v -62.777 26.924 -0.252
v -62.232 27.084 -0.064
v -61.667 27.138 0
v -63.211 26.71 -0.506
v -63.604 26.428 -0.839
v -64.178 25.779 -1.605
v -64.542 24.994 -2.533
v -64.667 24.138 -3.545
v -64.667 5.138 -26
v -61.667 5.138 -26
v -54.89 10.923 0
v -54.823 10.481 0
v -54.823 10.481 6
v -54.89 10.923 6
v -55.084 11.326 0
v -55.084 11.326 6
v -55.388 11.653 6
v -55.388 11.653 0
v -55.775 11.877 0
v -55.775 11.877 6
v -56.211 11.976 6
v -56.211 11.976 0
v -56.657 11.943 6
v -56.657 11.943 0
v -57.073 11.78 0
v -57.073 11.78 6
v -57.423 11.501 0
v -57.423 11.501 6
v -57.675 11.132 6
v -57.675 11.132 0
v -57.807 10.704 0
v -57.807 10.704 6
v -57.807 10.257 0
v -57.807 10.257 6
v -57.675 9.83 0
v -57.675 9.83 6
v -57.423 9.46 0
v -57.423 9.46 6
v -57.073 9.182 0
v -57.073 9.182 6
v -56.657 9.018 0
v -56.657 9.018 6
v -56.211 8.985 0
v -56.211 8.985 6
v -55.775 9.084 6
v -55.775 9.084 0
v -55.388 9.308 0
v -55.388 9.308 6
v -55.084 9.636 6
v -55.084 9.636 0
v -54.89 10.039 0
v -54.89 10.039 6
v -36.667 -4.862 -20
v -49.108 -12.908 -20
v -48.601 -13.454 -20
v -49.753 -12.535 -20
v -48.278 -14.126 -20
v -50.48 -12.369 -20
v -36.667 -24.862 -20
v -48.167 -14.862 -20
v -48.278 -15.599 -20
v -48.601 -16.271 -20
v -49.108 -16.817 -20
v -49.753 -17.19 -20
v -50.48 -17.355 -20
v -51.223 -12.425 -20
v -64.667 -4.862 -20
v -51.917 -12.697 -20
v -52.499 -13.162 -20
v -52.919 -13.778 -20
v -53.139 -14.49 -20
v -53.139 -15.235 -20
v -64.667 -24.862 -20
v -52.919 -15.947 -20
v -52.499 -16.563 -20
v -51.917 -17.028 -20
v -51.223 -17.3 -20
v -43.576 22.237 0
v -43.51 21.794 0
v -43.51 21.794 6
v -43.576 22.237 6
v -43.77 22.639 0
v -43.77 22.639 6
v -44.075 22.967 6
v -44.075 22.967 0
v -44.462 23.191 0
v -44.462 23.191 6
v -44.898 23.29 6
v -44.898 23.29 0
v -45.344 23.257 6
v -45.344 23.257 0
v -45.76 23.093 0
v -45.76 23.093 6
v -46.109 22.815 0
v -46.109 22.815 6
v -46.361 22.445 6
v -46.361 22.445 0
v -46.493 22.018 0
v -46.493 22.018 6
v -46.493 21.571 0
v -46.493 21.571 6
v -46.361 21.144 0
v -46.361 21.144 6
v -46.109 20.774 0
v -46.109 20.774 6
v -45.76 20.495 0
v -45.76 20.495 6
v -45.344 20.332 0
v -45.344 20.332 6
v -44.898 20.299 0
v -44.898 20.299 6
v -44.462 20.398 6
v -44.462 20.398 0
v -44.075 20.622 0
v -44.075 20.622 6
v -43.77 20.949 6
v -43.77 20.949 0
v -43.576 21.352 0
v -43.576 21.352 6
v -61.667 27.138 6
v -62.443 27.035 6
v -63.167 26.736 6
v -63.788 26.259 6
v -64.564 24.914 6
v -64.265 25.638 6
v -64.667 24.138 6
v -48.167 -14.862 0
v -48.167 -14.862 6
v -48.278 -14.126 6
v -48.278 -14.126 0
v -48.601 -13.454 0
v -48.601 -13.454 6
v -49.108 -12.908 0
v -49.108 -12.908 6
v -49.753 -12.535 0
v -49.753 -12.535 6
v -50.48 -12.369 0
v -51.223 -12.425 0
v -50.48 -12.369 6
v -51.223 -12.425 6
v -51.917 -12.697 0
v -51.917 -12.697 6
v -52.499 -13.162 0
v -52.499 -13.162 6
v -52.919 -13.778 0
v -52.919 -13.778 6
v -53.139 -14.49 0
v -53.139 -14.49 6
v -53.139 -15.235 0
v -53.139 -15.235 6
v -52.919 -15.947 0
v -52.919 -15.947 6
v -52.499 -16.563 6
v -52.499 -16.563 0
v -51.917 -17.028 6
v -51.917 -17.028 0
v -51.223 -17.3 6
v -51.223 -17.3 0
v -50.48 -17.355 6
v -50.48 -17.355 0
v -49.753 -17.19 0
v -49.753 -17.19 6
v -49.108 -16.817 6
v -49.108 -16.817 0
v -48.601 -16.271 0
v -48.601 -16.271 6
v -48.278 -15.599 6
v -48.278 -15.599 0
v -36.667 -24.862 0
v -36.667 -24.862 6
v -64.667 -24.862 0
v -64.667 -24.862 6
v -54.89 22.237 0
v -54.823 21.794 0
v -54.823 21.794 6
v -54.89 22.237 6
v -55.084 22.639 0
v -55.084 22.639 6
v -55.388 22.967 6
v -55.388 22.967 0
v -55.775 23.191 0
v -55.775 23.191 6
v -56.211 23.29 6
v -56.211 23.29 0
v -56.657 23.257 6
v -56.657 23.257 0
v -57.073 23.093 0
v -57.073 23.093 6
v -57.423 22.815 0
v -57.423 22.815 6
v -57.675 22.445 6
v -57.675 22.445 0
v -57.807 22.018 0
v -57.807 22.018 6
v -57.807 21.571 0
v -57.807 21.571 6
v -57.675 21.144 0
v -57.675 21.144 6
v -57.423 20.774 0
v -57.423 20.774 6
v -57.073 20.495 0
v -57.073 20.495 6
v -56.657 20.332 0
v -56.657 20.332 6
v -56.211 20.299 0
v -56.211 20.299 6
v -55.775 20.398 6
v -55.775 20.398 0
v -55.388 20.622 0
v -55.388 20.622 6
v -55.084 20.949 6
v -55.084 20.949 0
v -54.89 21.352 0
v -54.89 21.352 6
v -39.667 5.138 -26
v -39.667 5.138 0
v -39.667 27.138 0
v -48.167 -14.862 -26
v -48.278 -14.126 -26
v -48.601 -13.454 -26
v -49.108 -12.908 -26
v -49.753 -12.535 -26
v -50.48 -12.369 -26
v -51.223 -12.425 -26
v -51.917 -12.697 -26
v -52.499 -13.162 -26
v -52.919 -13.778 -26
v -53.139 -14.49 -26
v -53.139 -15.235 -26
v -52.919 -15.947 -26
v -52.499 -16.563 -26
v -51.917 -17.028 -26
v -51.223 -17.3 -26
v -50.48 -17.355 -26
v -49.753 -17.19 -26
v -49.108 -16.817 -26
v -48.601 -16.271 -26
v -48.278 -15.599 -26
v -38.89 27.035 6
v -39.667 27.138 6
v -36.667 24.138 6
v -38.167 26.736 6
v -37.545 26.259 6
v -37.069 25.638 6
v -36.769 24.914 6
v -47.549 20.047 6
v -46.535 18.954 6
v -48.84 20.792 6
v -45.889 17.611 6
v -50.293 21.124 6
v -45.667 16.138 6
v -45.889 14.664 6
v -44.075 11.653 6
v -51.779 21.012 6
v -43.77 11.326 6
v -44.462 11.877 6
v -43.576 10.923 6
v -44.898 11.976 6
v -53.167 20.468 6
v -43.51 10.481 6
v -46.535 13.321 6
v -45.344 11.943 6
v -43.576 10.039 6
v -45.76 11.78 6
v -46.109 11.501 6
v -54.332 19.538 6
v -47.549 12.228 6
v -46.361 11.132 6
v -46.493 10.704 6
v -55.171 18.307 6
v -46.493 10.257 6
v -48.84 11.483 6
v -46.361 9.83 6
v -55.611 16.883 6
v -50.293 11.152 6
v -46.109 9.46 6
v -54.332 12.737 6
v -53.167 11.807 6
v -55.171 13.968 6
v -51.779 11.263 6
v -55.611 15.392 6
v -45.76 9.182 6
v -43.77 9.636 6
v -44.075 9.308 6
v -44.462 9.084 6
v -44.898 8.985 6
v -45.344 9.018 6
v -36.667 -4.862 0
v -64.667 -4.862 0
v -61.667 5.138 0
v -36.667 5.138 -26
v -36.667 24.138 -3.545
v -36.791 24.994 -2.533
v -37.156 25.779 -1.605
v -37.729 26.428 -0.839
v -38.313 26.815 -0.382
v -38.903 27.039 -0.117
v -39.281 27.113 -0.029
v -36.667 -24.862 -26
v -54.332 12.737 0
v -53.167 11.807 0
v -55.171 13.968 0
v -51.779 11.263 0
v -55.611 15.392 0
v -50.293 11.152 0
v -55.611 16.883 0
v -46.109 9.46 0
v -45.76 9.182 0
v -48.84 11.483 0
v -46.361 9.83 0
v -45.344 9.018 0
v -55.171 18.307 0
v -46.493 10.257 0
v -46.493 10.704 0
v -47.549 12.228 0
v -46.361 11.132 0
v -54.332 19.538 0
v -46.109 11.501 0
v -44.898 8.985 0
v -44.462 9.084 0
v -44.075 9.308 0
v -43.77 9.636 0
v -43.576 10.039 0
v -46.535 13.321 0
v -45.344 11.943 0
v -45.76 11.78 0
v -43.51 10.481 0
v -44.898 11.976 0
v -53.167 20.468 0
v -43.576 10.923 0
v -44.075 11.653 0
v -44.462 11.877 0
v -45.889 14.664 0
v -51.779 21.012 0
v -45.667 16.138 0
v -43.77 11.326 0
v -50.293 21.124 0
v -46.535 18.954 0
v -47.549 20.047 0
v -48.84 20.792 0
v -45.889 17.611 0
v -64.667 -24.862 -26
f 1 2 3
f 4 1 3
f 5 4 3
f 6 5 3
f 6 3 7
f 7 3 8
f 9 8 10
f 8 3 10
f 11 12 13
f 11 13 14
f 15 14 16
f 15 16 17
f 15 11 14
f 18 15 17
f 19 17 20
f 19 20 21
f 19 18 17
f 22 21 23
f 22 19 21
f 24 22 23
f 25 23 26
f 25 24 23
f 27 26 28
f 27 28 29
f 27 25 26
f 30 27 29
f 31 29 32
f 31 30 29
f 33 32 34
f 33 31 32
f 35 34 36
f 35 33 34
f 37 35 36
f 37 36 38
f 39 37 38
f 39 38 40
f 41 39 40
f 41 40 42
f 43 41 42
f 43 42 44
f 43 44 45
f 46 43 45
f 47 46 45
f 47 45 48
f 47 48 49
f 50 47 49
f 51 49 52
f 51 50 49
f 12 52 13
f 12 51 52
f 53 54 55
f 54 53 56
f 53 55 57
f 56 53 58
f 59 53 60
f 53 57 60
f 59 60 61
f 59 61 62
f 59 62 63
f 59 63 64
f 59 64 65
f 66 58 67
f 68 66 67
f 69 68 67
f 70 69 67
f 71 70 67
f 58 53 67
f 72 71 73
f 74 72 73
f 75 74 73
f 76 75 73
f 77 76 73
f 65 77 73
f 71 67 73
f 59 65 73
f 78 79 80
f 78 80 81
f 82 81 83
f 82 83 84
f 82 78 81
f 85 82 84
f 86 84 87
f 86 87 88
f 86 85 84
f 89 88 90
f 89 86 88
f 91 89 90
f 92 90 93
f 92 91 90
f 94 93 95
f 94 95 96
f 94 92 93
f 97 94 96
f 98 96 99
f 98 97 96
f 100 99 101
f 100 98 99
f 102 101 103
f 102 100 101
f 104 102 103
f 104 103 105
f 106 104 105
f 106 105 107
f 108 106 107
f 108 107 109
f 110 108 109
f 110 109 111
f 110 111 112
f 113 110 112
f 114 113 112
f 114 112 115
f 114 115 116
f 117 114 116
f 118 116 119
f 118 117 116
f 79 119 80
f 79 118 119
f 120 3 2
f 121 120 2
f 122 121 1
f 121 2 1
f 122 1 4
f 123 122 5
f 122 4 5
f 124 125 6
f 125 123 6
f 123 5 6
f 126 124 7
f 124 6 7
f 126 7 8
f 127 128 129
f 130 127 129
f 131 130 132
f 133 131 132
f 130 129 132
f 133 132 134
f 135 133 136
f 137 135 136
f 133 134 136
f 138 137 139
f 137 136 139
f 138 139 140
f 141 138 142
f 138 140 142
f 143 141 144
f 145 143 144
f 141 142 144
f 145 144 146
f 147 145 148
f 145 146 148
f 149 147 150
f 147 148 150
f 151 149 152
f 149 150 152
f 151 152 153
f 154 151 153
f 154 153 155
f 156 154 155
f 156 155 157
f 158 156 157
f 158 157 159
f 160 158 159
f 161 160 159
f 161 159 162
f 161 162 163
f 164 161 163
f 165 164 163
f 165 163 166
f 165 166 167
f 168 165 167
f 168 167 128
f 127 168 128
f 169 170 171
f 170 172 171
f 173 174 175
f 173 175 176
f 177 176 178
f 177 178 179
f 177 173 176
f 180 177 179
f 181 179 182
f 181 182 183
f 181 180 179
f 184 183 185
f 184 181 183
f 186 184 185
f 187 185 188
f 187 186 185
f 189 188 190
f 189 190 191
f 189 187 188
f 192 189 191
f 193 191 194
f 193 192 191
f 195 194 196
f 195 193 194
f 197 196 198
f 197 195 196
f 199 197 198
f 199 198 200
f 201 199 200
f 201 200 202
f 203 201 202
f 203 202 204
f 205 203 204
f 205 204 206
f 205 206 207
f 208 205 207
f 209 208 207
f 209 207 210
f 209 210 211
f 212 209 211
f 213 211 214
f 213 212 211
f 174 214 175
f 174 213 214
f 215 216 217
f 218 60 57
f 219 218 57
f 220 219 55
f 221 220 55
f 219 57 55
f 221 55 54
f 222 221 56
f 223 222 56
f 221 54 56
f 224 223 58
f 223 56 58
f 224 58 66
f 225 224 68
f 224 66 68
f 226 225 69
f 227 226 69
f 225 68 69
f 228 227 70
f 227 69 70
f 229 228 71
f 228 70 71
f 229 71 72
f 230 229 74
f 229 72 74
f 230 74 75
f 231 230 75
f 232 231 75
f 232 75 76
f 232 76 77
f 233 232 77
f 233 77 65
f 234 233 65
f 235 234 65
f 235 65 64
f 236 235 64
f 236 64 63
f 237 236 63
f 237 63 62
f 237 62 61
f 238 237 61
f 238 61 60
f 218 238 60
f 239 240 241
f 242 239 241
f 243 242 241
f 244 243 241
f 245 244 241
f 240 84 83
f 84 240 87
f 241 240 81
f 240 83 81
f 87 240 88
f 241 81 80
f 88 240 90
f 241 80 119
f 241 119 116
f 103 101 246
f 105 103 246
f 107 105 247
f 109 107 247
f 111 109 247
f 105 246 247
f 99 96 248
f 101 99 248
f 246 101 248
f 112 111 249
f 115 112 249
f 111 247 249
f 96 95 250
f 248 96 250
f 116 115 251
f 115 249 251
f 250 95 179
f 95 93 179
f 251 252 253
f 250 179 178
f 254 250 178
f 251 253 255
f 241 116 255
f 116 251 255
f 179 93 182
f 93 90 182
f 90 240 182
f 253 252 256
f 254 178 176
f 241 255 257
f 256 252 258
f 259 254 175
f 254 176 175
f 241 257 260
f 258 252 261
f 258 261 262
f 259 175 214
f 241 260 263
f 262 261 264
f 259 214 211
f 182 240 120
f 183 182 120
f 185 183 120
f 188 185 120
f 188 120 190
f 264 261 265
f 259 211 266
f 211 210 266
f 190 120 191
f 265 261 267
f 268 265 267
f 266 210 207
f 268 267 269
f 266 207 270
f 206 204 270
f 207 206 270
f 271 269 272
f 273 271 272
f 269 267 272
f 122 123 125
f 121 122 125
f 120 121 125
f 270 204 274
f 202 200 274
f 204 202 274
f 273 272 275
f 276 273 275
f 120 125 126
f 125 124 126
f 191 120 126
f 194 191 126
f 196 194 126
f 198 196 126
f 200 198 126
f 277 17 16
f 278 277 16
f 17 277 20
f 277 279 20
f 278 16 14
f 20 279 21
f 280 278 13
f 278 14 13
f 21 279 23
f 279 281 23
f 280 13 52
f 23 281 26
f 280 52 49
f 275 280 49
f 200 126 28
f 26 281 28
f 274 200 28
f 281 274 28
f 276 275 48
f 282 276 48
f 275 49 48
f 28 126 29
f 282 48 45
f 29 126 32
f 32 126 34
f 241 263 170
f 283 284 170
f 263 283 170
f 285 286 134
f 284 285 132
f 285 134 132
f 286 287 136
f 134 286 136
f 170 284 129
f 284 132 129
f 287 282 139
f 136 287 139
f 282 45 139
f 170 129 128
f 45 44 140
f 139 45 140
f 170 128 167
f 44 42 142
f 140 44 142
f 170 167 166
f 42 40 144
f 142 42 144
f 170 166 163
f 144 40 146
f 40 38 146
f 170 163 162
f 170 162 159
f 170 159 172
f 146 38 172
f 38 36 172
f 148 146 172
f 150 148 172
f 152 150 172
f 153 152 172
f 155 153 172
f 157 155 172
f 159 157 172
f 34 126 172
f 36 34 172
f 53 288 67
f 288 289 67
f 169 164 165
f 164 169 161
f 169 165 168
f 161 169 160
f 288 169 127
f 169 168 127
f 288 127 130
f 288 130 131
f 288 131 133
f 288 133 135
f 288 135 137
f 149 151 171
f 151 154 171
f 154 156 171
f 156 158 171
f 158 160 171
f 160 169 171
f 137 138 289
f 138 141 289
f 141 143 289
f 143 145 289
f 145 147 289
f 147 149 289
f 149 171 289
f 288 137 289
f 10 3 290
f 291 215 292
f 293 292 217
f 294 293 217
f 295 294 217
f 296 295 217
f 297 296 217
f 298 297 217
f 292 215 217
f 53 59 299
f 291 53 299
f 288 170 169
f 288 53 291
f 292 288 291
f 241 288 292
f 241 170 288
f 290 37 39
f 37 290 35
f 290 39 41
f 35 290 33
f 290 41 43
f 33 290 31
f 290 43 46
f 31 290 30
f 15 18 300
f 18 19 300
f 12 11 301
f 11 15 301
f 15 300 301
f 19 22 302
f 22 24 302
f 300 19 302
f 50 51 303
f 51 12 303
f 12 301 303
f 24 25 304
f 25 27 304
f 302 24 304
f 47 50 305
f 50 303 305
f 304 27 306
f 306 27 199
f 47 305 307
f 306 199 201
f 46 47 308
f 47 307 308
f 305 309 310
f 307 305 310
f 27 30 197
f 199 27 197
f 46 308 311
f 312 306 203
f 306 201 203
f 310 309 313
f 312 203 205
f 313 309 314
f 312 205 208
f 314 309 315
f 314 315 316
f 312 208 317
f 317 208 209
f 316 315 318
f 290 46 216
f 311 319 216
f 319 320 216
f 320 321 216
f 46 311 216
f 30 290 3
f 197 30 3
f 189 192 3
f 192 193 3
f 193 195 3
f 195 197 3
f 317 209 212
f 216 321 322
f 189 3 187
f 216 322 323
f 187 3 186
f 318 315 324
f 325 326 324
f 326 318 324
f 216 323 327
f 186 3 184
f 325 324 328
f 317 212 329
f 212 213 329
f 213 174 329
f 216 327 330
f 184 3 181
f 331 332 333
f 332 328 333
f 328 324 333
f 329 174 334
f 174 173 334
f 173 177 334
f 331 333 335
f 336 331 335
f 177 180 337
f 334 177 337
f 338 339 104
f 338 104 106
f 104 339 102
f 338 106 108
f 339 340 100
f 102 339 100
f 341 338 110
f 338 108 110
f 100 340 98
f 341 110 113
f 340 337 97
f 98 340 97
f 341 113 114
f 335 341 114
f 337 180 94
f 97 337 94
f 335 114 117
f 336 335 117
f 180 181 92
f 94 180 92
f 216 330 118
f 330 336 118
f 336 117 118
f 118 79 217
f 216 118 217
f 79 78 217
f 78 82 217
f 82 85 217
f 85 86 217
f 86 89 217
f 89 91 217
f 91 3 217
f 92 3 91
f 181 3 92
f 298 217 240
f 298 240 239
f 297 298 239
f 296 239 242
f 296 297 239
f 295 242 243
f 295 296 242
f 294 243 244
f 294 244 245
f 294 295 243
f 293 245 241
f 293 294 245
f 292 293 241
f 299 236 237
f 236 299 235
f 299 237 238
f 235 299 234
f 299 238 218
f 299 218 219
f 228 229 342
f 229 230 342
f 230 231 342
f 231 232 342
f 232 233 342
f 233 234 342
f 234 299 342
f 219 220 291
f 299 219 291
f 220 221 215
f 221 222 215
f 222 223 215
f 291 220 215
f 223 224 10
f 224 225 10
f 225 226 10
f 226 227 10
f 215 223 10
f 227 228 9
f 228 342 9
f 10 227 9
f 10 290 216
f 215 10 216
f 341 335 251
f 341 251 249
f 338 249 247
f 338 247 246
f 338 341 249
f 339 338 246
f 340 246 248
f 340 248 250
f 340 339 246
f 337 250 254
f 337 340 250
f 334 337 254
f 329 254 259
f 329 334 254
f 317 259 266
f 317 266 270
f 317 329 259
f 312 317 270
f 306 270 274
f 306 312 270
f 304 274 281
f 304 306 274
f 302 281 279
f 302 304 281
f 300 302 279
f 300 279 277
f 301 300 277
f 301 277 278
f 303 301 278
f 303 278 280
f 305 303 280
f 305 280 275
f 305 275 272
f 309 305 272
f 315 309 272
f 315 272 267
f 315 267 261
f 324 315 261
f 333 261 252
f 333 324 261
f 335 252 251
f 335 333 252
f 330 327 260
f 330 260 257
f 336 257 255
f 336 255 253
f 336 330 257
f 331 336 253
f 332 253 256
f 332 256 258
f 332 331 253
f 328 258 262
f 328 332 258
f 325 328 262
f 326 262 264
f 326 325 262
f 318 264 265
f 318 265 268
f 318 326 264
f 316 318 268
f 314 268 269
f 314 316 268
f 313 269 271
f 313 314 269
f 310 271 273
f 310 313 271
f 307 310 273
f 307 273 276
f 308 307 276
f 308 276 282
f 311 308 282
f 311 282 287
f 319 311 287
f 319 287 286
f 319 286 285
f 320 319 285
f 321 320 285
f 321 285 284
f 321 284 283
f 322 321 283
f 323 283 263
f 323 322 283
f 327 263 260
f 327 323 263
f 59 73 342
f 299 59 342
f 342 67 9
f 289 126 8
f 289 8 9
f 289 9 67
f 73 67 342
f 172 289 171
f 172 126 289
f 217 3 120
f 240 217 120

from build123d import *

# Parameters (mm, degrees)
F0_W          = 22
F0_H          = 22
F0_R          = 1.5
F0_R_2        = 5
F1_DEPTH      = 6
F2_W          = 22
F2_H          = 32
F3_DEPTH      = 10
F4_W          = 22
F4_H          = 6
F5_DEPTH      = 20
F6_R          = 2.5
F7_DEPTH      = 32.001
F9_DEPTH      = 3
F11_DEPTH     = 3
F12_T1_DEPTH  = 21
F12_T6_DEPTH  = 5.7473088859
F12_S7_R      = 3
F12_T8_DEPTH  = 5
F12_T12_DEPTH = 5.7473088859
F12_S13_R     = 3
F12_T14_DEPTH = 5


# Not quite as in the source:
# - a fillet or chamfer that OpenCascade refuses, or shapes differently, is made with other operations: its cross-section is extruded or revolved along the edge and cut away or added
# - a feature of the source that left no trace in its solid (it failed there, or was rolled back) is left out


with BuildPart() as f1:
    # F0 (on Top) → F1 (new body)
    with BuildSketch(Plane.XY):
        with Locations((-50.6666042507, 16.1375404)):
            Rectangle(F0_W, F0_H)
        with Locations((-56.3234585002, 10.4806861505)):
            Circle(F0_R, mode=Mode.SUBTRACT)
        with Locations((-45.0097500012, 10.4806861505)):
            Circle(F0_R, mode=Mode.SUBTRACT)
        with Locations((-50.6666042507, 16.1375404)):
            Circle(F0_R_2, mode=Mode.SUBTRACT)
        with Locations((-56.3234585002, 21.7943946495)):
            Circle(F0_R, mode=Mode.SUBTRACT)
        with Locations((-45.0097500012, 21.7943946495)):
            Circle(F0_R, mode=Mode.SUBTRACT)
    extrude(amount=F1_DEPTH)

    # F2 (on face) → F3 (join)
    with BuildSketch(Plane.XZ.offset(-5.1375404)):
        with Locations((-50.6666042507, -10)):
            Rectangle(F2_W, F2_H)
    extrude(amount=F3_DEPTH)

    # F4 (on face) → F5 (join)
    with BuildSketch(Plane.XZ.offset(4.8624596)):
        with Locations((-50.6666042507, 3)):
            Rectangle(F4_W, F4_H)
        with Locations((-50.6666042507, -23)):
            Rectangle(F4_W, F4_H)
    extrude(amount=F5_DEPTH)

    # F6 (on face) → F7 (cut, through all)
    with BuildSketch(Plane.XY.offset(6)):
        with Locations((-50.6666042507, -14.8624596)):
            Circle(F6_R)
    extrude(amount=-F7_DEPTH, mode=Mode.SUBTRACT)

    # F8 (on face) → F9 (join)
    with BuildSketch(Plane(origin=(-61.6666042507, 0, 0), x_dir=(0, -1, 0), z_dir=(-1, 0, 0))):
        Polygon((-27.1375404, 0), (-5.1375404, -26), (-5.1375404, 0), align=None)
        Polygon((-5.1375404, 0), (-5.1375404, -26), (24.8624596, -26), (24.8624596, -20), (4.8624596, -20), (4.8624596, 0), (24.8624596, 0), (24.8624596, 6), (-27.1375404, 6), (-27.1375404, 0), align=None)
    extrude(amount=F9_DEPTH)

    # F10 (on face) → F11 (join)
    with BuildSketch(Plane.YZ.offset(-39.6666042507)):
        Polygon((5.1375404, 0), (5.1375404, -26), (27.1375404, 0), align=None)
        Polygon((-24.8624596, -26), (5.1375404, -26), (5.1375404, 0), (27.1375404, 0), (27.1375404, 6), (-24.8624596, 6), (-24.8624596, 0), (-4.8624596, 0), (-4.8624596, -20), (-24.8624596, -20), align=None)
    extrude(amount=F11_DEPTH)

    # F12: fillet of radius 3 on 4 edges, made by hand

    # F12_s2 → F12_t1 (cut)
    with BuildSketch(Plane.XY.offset(-7.5)):
        with BuildLine():
            ThreePointArc((-61.6666042507, 27.1375404), (-63.7879245942, 26.2588607436), (-64.6666042507, 24.1375404))
            Line((-64.6666042507, 24.1375404), (-64.6666042507, 27.1375404))
            Line((-64.6666042507, 27.1375404), (-61.6666042507, 27.1375404))
        make_face()
        with BuildLine():
            ThreePointArc((-39.6666042507, 27.1375404), (-37.5452839071, 26.2588607436), (-36.6666042507, 24.1375404))
            Line((-36.6666042507, 24.1375404), (-36.6666042507, 27.1375404))
            Line((-36.6666042507, 27.1375404), (-39.6666042507, 27.1375404))
        make_face()
    extrude(amount=F12_T1_DEPTH, mode=Mode.SUBTRACT)


with BuildPart() as f12_tool4:
    # F12_s5 → F12_t6 (new body)
    with BuildSketch(Plane.YZ.offset(-61.6666042507)):
        with BuildLine():
            ThreePointArc((27.1375404, 1.0989235543), (26.9544958992, 0.0670506378), (26.4276992561, -0.8389031701))
            Line((26.4276992561, -0.8389031701), (27.1375404, 0))
            Line((27.1375404, 0), (27.1375404, 1.0989235543))
        make_face()
    extrude(amount=-F12_T6_DEPTH)

    # F12_s7 → F12_t8 (cut, symmetric)
    with BuildSketch(Plane.XY.offset(0.1)):
        with Locations((-61.6666042507, 24.1375404)):
            Circle(F12_S7_R)
    extrude(amount=F12_T8_DEPTH, both=True, mode=Mode.SUBTRACT)


with BuildPart() as f1_1:
    add(f1.part)

    # F12_t3: cut F12_tool4
    add(f12_tool4.part, mode=Mode.SUBTRACT)


with BuildPart() as f12_tool10:
    # F12_s11 → F12_t12 (new body)
    with BuildSketch(Plane.YZ.offset(-39.6666042507)):
        with BuildLine():
            ThreePointArc((27.1375404, 1.0989235543), (26.9544958992, 0.0670506378), (26.4276992561, -0.8389031701))
            Line((26.4276992561, -0.8389031701), (27.1375404, 0))
            Line((27.1375404, 0), (27.1375404, 1.0989235543))
        make_face()
    extrude(amount=F12_T12_DEPTH)

    # F12_s13 → F12_t14 (cut, symmetric)
    with BuildSketch(Plane.XY.offset(0.1)):
        with Locations((-39.6666042507, 24.1375404)):
            Circle(F12_S13_R)
    extrude(amount=F12_T14_DEPTH, both=True, mode=Mode.SUBTRACT)


with BuildPart() as f1_2:
    add(f1_1.part)

    # F12_t9: cut F12_tool10
    add(f12_tool10.part, mode=Mode.SUBTRACT)


solid = f1_2.part
